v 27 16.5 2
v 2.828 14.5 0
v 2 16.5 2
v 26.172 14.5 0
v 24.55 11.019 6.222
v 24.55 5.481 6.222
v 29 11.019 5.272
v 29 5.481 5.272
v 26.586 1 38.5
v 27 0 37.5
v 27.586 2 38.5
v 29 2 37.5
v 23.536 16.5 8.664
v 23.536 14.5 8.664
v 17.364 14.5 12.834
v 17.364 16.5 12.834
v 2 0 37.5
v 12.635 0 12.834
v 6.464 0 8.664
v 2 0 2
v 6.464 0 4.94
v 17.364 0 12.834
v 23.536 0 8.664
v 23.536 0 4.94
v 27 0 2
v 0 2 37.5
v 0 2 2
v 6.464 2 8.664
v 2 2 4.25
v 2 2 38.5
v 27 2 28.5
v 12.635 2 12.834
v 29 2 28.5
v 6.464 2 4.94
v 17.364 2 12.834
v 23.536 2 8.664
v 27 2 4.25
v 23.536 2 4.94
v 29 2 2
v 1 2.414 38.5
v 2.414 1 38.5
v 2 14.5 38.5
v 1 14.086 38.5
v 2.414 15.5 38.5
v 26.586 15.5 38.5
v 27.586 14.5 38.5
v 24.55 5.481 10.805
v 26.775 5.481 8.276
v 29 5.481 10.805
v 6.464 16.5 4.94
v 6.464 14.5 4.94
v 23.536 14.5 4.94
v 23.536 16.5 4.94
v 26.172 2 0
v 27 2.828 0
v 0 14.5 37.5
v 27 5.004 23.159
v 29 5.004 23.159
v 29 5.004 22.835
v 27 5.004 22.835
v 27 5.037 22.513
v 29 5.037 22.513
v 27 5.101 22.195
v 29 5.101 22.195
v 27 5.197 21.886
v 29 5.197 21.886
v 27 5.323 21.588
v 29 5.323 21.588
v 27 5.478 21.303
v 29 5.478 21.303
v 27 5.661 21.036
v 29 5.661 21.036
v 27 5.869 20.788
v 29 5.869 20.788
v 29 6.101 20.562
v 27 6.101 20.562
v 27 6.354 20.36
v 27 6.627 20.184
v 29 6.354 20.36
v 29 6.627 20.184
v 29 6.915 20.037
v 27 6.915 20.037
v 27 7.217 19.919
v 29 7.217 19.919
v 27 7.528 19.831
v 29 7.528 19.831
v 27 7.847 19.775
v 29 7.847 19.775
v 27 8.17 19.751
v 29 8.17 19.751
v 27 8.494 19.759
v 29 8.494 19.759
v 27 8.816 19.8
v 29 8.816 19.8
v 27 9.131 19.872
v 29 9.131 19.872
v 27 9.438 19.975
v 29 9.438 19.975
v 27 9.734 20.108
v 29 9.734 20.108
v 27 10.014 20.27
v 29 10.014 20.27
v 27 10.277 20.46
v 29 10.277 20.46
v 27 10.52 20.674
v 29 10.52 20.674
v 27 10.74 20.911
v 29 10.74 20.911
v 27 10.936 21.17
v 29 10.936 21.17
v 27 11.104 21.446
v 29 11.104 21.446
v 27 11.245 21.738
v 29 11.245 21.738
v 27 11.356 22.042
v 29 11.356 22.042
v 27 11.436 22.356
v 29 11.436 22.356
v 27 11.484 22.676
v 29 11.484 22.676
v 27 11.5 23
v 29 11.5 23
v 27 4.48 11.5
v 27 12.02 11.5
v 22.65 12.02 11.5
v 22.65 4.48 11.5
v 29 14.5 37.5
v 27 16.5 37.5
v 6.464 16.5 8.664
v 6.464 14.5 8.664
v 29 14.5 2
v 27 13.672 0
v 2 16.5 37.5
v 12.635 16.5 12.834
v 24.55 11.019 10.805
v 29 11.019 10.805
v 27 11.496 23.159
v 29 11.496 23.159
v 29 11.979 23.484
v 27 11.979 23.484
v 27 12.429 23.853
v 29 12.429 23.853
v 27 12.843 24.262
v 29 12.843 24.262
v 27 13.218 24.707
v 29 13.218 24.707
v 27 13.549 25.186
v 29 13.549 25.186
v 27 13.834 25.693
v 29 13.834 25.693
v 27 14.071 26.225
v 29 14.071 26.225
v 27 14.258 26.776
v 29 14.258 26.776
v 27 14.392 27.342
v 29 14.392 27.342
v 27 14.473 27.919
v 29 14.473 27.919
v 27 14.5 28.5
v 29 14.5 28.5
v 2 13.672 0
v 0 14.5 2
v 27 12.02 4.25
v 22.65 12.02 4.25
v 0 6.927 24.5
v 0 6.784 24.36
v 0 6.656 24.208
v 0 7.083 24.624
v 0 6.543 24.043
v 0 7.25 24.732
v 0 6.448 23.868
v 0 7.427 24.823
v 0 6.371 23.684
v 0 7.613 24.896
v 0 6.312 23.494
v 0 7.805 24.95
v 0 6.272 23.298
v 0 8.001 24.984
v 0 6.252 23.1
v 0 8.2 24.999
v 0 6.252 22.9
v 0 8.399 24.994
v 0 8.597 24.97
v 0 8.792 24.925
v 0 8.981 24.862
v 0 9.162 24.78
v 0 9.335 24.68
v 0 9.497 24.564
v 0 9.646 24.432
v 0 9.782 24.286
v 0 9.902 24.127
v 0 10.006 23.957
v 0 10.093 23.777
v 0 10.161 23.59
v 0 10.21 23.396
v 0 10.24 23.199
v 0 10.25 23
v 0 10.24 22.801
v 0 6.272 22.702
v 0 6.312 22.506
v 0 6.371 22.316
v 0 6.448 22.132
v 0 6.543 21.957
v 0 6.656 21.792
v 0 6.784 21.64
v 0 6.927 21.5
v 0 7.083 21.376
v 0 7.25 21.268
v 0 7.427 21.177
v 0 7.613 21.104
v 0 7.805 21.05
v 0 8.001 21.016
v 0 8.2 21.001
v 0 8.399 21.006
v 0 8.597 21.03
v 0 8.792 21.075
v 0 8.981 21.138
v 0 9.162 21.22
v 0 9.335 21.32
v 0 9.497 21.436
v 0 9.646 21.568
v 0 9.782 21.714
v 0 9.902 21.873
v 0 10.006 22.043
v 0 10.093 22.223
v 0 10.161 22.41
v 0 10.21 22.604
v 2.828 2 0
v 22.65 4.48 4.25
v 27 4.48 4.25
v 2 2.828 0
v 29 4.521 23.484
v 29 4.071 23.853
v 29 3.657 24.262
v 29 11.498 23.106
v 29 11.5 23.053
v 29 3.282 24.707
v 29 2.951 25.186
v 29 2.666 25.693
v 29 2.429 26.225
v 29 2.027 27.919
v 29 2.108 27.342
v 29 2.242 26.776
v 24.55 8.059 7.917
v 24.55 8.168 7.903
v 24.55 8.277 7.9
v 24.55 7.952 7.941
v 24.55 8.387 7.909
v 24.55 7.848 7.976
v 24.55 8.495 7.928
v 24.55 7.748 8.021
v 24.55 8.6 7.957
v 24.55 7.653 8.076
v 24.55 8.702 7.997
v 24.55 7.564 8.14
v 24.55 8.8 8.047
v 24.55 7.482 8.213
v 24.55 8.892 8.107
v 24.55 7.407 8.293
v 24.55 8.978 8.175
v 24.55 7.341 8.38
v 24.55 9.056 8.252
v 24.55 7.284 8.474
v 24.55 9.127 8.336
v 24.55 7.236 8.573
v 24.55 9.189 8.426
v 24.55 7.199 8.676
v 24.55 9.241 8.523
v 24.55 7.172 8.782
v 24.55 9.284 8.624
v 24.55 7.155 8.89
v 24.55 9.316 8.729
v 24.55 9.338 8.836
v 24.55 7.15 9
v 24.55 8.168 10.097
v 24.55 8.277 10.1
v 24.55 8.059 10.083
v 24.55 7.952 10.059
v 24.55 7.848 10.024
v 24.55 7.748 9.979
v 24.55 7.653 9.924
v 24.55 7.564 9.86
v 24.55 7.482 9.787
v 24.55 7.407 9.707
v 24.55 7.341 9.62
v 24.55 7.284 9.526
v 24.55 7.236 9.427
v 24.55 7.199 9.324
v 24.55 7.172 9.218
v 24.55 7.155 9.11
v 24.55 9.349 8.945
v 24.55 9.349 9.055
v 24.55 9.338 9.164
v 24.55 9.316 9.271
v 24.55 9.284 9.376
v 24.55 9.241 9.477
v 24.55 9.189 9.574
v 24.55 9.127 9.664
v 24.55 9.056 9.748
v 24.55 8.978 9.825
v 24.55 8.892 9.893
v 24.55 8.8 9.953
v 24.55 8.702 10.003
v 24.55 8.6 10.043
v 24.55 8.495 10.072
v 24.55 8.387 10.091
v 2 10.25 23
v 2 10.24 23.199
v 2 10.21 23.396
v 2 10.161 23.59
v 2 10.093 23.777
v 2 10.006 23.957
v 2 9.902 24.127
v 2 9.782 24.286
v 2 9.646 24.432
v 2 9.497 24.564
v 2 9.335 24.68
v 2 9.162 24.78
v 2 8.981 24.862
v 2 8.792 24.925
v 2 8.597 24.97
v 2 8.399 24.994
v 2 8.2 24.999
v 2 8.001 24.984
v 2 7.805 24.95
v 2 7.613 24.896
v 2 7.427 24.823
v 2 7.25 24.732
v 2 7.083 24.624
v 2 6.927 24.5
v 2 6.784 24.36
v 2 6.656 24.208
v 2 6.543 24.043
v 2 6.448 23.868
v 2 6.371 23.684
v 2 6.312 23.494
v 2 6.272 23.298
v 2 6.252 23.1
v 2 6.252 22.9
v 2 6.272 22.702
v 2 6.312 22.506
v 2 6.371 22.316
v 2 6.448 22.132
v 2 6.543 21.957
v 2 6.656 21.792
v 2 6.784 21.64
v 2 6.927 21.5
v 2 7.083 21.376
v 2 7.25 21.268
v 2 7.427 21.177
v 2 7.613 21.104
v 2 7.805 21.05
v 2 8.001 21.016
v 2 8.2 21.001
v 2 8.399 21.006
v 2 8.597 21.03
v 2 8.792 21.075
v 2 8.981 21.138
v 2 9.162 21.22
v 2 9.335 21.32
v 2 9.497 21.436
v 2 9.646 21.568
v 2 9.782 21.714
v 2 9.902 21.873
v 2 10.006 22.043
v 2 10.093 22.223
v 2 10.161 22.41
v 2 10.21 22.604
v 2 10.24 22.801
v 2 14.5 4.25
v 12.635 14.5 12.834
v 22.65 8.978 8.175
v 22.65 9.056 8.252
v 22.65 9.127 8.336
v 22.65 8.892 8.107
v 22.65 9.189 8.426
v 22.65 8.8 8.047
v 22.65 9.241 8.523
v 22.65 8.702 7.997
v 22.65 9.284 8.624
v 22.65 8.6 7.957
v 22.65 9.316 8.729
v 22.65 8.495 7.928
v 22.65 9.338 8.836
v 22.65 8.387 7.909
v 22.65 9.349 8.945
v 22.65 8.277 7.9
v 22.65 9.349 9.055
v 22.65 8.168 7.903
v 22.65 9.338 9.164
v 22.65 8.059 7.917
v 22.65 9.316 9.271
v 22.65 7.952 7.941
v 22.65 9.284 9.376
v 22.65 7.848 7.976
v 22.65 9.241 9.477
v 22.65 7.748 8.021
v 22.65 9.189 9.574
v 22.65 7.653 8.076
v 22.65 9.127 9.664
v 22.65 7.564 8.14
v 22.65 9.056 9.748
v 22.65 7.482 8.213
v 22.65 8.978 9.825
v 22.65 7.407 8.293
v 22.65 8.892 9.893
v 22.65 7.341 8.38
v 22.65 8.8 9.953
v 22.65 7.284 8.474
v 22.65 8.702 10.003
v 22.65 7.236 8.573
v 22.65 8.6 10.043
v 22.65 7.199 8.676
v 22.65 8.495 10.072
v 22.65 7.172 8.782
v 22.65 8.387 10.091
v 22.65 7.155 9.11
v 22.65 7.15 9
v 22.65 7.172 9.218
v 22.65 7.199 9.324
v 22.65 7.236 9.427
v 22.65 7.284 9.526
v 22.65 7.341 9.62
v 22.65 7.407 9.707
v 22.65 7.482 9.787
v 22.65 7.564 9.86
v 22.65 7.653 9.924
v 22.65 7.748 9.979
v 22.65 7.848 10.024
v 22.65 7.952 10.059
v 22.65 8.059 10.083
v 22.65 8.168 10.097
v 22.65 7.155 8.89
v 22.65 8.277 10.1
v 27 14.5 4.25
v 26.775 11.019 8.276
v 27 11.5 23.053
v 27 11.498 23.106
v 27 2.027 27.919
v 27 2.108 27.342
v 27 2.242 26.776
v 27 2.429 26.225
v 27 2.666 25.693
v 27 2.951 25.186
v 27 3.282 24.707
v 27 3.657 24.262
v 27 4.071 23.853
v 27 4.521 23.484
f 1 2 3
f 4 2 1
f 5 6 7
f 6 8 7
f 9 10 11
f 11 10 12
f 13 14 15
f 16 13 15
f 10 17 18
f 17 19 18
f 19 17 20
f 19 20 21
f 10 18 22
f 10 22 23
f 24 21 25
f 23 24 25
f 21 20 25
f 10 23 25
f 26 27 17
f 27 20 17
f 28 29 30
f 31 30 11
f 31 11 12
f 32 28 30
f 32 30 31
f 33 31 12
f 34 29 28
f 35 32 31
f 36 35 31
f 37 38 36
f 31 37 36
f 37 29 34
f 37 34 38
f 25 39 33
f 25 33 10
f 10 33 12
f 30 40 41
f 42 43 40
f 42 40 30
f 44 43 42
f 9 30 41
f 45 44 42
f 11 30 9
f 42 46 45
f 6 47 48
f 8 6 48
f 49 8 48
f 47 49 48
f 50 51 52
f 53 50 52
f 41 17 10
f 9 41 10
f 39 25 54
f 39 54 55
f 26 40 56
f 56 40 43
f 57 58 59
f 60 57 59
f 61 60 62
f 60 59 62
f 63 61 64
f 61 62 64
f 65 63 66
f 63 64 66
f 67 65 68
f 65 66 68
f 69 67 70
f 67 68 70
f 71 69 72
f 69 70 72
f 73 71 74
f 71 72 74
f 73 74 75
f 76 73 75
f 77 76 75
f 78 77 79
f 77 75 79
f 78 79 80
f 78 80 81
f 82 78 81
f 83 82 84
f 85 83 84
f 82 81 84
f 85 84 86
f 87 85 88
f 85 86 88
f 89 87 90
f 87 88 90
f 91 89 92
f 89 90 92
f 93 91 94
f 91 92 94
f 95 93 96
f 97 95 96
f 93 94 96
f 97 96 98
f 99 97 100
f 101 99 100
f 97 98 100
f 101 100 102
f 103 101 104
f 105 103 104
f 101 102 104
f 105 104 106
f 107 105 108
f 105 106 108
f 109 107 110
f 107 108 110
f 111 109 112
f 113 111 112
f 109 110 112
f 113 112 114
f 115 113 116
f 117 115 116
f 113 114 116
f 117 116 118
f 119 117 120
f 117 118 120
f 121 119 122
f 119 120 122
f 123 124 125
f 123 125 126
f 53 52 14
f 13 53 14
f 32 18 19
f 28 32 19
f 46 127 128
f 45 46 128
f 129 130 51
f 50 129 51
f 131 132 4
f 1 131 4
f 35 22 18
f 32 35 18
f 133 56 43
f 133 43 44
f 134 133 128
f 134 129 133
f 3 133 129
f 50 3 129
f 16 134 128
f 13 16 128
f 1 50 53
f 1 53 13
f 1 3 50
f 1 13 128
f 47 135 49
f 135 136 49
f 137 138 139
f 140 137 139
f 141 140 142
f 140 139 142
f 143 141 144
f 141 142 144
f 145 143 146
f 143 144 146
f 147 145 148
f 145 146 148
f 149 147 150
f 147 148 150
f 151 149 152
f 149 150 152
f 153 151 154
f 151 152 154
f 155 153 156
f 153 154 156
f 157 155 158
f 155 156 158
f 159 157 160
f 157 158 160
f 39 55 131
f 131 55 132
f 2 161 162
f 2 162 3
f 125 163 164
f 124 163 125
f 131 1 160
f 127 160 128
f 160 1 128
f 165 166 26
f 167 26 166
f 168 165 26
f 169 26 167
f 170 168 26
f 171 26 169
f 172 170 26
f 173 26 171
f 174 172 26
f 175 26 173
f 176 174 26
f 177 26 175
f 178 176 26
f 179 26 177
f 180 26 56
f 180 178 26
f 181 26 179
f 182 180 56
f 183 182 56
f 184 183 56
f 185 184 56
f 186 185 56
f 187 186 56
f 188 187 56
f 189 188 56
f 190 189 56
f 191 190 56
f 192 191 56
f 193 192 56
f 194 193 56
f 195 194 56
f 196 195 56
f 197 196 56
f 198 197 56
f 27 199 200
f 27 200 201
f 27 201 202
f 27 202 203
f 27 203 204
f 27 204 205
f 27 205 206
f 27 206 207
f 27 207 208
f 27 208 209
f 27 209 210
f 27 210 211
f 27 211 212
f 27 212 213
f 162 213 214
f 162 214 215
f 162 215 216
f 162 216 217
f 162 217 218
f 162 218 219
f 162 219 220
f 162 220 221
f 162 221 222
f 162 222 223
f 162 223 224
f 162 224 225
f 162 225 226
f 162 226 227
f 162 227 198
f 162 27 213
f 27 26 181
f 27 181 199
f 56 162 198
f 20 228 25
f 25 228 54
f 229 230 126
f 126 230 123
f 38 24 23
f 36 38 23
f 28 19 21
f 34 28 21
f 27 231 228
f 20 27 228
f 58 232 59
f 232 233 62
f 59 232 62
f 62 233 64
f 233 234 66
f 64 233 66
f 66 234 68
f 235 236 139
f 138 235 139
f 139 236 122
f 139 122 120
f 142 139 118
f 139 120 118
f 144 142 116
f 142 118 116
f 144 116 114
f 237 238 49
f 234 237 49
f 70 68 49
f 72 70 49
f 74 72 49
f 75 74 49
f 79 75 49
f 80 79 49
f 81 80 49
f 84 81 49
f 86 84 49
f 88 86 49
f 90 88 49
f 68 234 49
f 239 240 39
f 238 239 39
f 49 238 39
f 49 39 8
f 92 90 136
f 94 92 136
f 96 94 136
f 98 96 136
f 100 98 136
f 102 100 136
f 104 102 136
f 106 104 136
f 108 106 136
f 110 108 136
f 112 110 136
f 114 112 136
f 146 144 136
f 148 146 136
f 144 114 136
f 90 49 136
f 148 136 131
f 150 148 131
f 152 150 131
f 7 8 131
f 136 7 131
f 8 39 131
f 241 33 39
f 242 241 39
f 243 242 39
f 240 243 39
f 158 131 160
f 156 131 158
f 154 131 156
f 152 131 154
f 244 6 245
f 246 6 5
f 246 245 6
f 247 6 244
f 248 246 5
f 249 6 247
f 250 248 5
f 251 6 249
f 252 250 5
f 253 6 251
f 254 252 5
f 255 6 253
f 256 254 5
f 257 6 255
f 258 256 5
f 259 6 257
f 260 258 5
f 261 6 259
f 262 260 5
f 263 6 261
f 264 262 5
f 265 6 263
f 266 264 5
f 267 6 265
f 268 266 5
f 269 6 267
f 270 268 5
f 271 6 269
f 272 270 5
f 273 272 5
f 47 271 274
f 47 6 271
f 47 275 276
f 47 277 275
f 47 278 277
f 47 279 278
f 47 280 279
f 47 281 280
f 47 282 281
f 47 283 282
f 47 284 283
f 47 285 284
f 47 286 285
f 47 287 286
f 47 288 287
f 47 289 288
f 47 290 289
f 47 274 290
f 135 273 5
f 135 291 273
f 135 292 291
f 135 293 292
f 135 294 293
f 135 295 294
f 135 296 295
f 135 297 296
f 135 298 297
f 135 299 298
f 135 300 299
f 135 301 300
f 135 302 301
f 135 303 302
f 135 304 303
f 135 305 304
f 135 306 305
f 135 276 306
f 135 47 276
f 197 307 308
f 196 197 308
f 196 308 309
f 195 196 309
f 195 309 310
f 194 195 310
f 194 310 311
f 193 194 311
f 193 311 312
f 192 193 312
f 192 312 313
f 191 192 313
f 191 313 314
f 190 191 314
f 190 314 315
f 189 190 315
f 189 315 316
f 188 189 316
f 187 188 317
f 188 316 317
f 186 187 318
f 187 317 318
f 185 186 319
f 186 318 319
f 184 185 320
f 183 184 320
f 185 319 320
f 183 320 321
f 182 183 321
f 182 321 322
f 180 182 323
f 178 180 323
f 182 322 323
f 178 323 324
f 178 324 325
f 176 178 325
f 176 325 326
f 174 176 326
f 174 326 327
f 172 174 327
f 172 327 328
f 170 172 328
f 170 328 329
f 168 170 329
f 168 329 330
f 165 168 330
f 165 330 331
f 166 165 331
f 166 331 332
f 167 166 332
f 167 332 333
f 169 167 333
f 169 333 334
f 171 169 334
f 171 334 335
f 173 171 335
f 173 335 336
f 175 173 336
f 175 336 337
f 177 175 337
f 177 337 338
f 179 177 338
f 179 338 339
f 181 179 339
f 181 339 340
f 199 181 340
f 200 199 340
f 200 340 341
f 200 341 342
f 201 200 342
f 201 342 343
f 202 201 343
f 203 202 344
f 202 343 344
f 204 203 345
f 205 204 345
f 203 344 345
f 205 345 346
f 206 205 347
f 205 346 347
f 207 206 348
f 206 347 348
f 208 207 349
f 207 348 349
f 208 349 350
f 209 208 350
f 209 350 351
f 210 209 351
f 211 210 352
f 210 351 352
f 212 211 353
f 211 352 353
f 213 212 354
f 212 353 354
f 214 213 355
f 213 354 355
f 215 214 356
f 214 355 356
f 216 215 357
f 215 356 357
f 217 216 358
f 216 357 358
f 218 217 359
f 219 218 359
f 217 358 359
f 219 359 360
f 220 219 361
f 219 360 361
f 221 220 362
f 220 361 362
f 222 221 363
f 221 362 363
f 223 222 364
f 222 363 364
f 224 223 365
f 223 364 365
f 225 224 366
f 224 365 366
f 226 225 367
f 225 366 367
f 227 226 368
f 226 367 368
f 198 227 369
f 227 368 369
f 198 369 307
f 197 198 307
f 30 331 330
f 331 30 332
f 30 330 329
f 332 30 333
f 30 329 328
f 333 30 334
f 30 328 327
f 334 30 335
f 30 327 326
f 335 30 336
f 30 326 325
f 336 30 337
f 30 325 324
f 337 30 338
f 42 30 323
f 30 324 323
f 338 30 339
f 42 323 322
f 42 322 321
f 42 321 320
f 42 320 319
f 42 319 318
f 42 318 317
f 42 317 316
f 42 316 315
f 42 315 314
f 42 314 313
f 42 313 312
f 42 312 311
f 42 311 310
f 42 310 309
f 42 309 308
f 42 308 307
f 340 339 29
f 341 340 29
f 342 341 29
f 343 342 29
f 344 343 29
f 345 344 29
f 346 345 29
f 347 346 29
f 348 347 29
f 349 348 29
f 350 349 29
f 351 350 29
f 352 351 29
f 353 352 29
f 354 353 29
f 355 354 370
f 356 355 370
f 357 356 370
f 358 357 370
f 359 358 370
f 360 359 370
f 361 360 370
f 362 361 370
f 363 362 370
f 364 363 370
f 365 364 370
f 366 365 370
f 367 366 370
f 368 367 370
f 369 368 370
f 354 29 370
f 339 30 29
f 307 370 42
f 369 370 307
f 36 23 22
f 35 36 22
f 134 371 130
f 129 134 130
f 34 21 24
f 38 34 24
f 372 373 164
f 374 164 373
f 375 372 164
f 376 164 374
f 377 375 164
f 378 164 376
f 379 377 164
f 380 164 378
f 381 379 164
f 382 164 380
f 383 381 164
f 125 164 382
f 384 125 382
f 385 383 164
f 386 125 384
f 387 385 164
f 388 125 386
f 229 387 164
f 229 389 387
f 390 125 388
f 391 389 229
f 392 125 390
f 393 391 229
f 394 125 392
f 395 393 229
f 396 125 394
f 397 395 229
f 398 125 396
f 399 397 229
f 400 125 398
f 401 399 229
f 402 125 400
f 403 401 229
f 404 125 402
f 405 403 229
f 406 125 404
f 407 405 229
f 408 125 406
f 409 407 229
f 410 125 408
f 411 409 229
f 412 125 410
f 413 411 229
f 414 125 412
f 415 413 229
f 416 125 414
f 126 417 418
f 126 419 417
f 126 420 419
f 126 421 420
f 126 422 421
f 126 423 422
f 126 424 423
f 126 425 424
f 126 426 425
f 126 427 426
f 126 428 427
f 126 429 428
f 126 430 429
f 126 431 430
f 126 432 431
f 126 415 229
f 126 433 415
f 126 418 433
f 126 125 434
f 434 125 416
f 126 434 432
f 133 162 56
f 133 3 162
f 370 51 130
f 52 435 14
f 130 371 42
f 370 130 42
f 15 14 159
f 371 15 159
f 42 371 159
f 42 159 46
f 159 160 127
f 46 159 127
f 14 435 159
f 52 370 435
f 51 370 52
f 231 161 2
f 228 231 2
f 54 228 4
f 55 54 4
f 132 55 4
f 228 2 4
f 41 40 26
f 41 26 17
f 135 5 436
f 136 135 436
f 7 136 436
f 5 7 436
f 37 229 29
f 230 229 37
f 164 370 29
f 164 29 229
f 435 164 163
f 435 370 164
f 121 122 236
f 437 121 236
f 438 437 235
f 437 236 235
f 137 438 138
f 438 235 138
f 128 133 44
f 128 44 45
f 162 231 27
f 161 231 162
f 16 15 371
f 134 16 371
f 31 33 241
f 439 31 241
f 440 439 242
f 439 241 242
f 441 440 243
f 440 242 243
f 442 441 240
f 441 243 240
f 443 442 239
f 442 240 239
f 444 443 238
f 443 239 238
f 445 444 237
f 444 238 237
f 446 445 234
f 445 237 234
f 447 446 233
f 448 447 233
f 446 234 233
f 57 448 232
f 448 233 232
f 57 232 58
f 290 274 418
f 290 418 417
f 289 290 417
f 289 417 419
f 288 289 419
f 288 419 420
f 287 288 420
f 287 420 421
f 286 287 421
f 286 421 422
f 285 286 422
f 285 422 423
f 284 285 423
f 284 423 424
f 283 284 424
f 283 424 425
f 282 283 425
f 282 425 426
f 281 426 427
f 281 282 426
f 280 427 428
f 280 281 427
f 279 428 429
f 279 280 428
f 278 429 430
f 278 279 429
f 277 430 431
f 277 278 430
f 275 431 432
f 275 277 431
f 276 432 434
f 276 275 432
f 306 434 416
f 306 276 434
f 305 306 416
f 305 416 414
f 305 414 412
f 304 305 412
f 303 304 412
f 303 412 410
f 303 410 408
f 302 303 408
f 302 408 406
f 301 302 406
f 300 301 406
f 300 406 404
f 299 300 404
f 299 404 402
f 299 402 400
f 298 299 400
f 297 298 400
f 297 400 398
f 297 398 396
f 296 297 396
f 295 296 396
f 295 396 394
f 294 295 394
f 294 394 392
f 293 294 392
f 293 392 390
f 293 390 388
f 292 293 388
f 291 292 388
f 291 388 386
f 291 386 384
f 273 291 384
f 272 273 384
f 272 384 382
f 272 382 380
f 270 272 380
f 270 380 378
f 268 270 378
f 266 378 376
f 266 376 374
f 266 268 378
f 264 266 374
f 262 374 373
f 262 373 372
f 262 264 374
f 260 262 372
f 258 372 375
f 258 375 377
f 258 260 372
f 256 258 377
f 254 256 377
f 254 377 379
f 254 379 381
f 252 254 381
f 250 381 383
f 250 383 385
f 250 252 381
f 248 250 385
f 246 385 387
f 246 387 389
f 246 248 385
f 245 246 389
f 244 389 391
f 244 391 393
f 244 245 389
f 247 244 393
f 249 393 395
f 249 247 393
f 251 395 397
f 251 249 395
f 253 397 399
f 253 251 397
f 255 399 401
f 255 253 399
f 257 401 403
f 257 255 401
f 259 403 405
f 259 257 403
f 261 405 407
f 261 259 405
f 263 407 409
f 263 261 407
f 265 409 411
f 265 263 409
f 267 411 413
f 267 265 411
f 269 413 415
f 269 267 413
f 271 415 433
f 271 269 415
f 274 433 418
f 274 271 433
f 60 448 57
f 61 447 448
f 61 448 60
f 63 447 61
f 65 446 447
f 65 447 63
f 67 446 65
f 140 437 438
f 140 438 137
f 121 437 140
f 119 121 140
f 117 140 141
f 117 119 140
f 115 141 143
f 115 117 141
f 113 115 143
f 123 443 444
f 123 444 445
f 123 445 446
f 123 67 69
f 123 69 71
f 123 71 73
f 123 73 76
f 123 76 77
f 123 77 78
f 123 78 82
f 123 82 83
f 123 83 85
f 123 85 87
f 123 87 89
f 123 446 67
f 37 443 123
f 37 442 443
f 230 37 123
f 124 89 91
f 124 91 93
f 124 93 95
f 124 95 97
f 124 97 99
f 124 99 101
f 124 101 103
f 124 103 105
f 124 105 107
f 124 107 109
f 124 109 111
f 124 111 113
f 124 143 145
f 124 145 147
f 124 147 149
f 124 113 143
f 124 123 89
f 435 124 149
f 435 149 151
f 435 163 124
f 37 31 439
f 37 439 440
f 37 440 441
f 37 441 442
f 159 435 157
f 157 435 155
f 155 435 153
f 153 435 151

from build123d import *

# Parameters (mm, degrees)
F0_W      = 29
F0_H      = 16.5
F1_DEPTH  = 38.5
F2_T      = -2
F3_DEPTH  = 2.25
F4_SIZE   = 2
F5_SIZE   = 2
F6_SIZE   = 1
F8_DEPTH  = 16.501
F9_W      = 12.5
F9_H      = 1
F10_DEPTH = 2
F11_R     = 2
F12_DEPTH = 2.001
F13_W     = 7.54
F13_H     = 7.25
F13_R     = 1.1
F14_DEPTH = 4.35
F17_W     = 5.538
F17_H     = 4.583
F15_W     = 5.538
F15_H     = 5.533


with BuildPart() as f1:
    # F0 (on Top) → F1 (new body)
    with BuildSketch(Plane.XY):
        with Locations((14.5, 8.25)):
            Rectangle(F0_W, F0_H)
    extrude(amount=F1_DEPTH)

    # F2
    f2_openings = [f1.faces().sort_by_distance(p)[0] for p in [
        (14.5, 8.25, 38.5),
    ]]
    offset(amount=F2_T, openings=f2_openings)

    # F3 (add): a face of the model
    f3_faces = [f1.faces().sort_by_distance(p)[0] for p in [
        (14.5, 8.25, 2),
    ]]
    extrude(f3_faces, amount=F3_DEPTH)

    # F4
    f4_edges = [f1.edges().sort_by_distance(p)[0] for p in [
        (29, 0, 19.25),
        (0, 0, 19.25),
        (29, 16.5, 19.25),
        (0, 16.5, 19.25),
    ]]
    chamfer(f4_edges, length=F4_SIZE)

    # F5
    f5_edges = [f1.edges().sort_by_distance(p)[0] for p in [
        (0, 8.25, 0),
        (1, 15.5, 0),
        (1, 1, 0),
        (14.5, 16.5, 0),
        (14.5, 0, 0),
        (28, 15.5, 0),
        (28, 1, 0),
        (29, 8.25, 0),
    ]]
    chamfer(f5_edges, length=F5_SIZE)

    # F6
    f6_edges = [f1.edges().sort_by_distance(p)[0] for p in [
        (14.5, 0, 38.5),
        (1, 1, 38.5),
        (0, 8.25, 38.5),
        (1, 15.5, 38.5),
        (14.5, 16.5, 38.5),
        (28, 15.5, 38.5),
        (29, 8.25, 38.5),
        (28, 1, 38.5),
    ]]
    chamfer(f6_edges, length=F6_SIZE)

    # F7 (on face) → F8 (cut, through all)
    with BuildSketch(Plane.XZ):
        Polygon((6.464, 8.664), (6.464, 4.94), (23.536, 4.94), (23.536, 8.664), (17.364, 12.834), (12.635, 12.834), align=None)
    extrude(amount=-F8_DEPTH, mode=Mode.SUBTRACT)

    # F9 (on face) → F10 (cut, through all)
    with BuildSketch(Plane.YZ.offset(29)):
        with BuildLine():
            ThreePointArc((5.0038961688, 23.1590909091), (8.25, 22.25), (11.4961038312, 23.1590909091))
            ThreePointArc((11.4961038312, 23.1590909091), (8.25, 26.25), (5.0038961688, 23.1590909091))
        make_face()
        with BuildLine():
            ThreePointArc((5.0038961688, 23.1590909091), (8.1704306945, 19.7509741882), (11.5, 23))
            ThreePointArc((11.5, 23), (11.4990258118, 23.0795693055), (11.4961038312, 23.1590909091))
            ThreePointArc((11.4961038312, 23.1590909091), (8.25, 22.25), (5.0038961688, 23.1590909091))
        make_face()
        with BuildLine():
            ThreePointArc((5.0038961688, 23.1590909091), (8.25, 26.25), (11.4961038312, 23.1590909091))
            ThreePointArc((11.4961038312, 23.1590909091), (13.6975062618, 25.4361502113), (14.5, 28.5))
            Line((14.5, 28.5), (2, 28.5))
            ThreePointArc((2, 28.5), (2.8024937382, 25.4361502113), (5.0038961688, 23.1590909091))
        make_face()
        with BuildLine():
            Line((2, 28.5), (14.5, 28.5))
            ThreePointArc((14.5, 28.5), (8.25, 34.75), (2, 28.5))
        make_face()
        with BuildLine():
            ThreePointArc((2, 28.5), (8.25, 34.75), (14.5, 28.5))
            Line((14.5, 28.5), (14.5, 37.5))
            Line((14.5, 37.5), (2, 37.5))
            Line((2, 37.5), (2, 28.5))
        make_face()
        with Locations((8.25, 38)):
            Rectangle(F9_W, F9_H)
    extrude(amount=-F10_DEPTH, mode=Mode.SUBTRACT)

    # F11 (on face) → F12 (cut, through all)
    with BuildSketch(Plane.YZ.offset(2)):
        with Locations((8.25, 23)):
            Circle(F11_R)
    extrude(amount=-F12_DEPTH, mode=Mode.SUBTRACT)

    # F13 (on face) → F14 (join)
    with BuildSketch(Plane(origin=(27, 0, 0), x_dir=(0, -1, 0), z_dir=(-1, 0, 0))):
        with Locations((-8.25, 7.875)):
            Rectangle(F13_W, F13_H)
        with Locations((-8.25, 9)):
            Circle(F13_R, mode=Mode.SUBTRACT)
    extrude(amount=F14_DEPTH)

    # F17 (on offset) → F18 section 0
    with BuildSketch(Plane.YZ.offset(24.55)):
        with Locations((8.25, 8.5135)):
            Rectangle(F17_W, F17_H)
    # F15 (on face) → F18 section 1
    with BuildSketch(Plane.YZ.offset(29)):
        with Locations((8.25, 8.0385)):
            Rectangle(F15_W, F15_H)
    loft(mode=Mode.SUBTRACT)


solid = f1.part
